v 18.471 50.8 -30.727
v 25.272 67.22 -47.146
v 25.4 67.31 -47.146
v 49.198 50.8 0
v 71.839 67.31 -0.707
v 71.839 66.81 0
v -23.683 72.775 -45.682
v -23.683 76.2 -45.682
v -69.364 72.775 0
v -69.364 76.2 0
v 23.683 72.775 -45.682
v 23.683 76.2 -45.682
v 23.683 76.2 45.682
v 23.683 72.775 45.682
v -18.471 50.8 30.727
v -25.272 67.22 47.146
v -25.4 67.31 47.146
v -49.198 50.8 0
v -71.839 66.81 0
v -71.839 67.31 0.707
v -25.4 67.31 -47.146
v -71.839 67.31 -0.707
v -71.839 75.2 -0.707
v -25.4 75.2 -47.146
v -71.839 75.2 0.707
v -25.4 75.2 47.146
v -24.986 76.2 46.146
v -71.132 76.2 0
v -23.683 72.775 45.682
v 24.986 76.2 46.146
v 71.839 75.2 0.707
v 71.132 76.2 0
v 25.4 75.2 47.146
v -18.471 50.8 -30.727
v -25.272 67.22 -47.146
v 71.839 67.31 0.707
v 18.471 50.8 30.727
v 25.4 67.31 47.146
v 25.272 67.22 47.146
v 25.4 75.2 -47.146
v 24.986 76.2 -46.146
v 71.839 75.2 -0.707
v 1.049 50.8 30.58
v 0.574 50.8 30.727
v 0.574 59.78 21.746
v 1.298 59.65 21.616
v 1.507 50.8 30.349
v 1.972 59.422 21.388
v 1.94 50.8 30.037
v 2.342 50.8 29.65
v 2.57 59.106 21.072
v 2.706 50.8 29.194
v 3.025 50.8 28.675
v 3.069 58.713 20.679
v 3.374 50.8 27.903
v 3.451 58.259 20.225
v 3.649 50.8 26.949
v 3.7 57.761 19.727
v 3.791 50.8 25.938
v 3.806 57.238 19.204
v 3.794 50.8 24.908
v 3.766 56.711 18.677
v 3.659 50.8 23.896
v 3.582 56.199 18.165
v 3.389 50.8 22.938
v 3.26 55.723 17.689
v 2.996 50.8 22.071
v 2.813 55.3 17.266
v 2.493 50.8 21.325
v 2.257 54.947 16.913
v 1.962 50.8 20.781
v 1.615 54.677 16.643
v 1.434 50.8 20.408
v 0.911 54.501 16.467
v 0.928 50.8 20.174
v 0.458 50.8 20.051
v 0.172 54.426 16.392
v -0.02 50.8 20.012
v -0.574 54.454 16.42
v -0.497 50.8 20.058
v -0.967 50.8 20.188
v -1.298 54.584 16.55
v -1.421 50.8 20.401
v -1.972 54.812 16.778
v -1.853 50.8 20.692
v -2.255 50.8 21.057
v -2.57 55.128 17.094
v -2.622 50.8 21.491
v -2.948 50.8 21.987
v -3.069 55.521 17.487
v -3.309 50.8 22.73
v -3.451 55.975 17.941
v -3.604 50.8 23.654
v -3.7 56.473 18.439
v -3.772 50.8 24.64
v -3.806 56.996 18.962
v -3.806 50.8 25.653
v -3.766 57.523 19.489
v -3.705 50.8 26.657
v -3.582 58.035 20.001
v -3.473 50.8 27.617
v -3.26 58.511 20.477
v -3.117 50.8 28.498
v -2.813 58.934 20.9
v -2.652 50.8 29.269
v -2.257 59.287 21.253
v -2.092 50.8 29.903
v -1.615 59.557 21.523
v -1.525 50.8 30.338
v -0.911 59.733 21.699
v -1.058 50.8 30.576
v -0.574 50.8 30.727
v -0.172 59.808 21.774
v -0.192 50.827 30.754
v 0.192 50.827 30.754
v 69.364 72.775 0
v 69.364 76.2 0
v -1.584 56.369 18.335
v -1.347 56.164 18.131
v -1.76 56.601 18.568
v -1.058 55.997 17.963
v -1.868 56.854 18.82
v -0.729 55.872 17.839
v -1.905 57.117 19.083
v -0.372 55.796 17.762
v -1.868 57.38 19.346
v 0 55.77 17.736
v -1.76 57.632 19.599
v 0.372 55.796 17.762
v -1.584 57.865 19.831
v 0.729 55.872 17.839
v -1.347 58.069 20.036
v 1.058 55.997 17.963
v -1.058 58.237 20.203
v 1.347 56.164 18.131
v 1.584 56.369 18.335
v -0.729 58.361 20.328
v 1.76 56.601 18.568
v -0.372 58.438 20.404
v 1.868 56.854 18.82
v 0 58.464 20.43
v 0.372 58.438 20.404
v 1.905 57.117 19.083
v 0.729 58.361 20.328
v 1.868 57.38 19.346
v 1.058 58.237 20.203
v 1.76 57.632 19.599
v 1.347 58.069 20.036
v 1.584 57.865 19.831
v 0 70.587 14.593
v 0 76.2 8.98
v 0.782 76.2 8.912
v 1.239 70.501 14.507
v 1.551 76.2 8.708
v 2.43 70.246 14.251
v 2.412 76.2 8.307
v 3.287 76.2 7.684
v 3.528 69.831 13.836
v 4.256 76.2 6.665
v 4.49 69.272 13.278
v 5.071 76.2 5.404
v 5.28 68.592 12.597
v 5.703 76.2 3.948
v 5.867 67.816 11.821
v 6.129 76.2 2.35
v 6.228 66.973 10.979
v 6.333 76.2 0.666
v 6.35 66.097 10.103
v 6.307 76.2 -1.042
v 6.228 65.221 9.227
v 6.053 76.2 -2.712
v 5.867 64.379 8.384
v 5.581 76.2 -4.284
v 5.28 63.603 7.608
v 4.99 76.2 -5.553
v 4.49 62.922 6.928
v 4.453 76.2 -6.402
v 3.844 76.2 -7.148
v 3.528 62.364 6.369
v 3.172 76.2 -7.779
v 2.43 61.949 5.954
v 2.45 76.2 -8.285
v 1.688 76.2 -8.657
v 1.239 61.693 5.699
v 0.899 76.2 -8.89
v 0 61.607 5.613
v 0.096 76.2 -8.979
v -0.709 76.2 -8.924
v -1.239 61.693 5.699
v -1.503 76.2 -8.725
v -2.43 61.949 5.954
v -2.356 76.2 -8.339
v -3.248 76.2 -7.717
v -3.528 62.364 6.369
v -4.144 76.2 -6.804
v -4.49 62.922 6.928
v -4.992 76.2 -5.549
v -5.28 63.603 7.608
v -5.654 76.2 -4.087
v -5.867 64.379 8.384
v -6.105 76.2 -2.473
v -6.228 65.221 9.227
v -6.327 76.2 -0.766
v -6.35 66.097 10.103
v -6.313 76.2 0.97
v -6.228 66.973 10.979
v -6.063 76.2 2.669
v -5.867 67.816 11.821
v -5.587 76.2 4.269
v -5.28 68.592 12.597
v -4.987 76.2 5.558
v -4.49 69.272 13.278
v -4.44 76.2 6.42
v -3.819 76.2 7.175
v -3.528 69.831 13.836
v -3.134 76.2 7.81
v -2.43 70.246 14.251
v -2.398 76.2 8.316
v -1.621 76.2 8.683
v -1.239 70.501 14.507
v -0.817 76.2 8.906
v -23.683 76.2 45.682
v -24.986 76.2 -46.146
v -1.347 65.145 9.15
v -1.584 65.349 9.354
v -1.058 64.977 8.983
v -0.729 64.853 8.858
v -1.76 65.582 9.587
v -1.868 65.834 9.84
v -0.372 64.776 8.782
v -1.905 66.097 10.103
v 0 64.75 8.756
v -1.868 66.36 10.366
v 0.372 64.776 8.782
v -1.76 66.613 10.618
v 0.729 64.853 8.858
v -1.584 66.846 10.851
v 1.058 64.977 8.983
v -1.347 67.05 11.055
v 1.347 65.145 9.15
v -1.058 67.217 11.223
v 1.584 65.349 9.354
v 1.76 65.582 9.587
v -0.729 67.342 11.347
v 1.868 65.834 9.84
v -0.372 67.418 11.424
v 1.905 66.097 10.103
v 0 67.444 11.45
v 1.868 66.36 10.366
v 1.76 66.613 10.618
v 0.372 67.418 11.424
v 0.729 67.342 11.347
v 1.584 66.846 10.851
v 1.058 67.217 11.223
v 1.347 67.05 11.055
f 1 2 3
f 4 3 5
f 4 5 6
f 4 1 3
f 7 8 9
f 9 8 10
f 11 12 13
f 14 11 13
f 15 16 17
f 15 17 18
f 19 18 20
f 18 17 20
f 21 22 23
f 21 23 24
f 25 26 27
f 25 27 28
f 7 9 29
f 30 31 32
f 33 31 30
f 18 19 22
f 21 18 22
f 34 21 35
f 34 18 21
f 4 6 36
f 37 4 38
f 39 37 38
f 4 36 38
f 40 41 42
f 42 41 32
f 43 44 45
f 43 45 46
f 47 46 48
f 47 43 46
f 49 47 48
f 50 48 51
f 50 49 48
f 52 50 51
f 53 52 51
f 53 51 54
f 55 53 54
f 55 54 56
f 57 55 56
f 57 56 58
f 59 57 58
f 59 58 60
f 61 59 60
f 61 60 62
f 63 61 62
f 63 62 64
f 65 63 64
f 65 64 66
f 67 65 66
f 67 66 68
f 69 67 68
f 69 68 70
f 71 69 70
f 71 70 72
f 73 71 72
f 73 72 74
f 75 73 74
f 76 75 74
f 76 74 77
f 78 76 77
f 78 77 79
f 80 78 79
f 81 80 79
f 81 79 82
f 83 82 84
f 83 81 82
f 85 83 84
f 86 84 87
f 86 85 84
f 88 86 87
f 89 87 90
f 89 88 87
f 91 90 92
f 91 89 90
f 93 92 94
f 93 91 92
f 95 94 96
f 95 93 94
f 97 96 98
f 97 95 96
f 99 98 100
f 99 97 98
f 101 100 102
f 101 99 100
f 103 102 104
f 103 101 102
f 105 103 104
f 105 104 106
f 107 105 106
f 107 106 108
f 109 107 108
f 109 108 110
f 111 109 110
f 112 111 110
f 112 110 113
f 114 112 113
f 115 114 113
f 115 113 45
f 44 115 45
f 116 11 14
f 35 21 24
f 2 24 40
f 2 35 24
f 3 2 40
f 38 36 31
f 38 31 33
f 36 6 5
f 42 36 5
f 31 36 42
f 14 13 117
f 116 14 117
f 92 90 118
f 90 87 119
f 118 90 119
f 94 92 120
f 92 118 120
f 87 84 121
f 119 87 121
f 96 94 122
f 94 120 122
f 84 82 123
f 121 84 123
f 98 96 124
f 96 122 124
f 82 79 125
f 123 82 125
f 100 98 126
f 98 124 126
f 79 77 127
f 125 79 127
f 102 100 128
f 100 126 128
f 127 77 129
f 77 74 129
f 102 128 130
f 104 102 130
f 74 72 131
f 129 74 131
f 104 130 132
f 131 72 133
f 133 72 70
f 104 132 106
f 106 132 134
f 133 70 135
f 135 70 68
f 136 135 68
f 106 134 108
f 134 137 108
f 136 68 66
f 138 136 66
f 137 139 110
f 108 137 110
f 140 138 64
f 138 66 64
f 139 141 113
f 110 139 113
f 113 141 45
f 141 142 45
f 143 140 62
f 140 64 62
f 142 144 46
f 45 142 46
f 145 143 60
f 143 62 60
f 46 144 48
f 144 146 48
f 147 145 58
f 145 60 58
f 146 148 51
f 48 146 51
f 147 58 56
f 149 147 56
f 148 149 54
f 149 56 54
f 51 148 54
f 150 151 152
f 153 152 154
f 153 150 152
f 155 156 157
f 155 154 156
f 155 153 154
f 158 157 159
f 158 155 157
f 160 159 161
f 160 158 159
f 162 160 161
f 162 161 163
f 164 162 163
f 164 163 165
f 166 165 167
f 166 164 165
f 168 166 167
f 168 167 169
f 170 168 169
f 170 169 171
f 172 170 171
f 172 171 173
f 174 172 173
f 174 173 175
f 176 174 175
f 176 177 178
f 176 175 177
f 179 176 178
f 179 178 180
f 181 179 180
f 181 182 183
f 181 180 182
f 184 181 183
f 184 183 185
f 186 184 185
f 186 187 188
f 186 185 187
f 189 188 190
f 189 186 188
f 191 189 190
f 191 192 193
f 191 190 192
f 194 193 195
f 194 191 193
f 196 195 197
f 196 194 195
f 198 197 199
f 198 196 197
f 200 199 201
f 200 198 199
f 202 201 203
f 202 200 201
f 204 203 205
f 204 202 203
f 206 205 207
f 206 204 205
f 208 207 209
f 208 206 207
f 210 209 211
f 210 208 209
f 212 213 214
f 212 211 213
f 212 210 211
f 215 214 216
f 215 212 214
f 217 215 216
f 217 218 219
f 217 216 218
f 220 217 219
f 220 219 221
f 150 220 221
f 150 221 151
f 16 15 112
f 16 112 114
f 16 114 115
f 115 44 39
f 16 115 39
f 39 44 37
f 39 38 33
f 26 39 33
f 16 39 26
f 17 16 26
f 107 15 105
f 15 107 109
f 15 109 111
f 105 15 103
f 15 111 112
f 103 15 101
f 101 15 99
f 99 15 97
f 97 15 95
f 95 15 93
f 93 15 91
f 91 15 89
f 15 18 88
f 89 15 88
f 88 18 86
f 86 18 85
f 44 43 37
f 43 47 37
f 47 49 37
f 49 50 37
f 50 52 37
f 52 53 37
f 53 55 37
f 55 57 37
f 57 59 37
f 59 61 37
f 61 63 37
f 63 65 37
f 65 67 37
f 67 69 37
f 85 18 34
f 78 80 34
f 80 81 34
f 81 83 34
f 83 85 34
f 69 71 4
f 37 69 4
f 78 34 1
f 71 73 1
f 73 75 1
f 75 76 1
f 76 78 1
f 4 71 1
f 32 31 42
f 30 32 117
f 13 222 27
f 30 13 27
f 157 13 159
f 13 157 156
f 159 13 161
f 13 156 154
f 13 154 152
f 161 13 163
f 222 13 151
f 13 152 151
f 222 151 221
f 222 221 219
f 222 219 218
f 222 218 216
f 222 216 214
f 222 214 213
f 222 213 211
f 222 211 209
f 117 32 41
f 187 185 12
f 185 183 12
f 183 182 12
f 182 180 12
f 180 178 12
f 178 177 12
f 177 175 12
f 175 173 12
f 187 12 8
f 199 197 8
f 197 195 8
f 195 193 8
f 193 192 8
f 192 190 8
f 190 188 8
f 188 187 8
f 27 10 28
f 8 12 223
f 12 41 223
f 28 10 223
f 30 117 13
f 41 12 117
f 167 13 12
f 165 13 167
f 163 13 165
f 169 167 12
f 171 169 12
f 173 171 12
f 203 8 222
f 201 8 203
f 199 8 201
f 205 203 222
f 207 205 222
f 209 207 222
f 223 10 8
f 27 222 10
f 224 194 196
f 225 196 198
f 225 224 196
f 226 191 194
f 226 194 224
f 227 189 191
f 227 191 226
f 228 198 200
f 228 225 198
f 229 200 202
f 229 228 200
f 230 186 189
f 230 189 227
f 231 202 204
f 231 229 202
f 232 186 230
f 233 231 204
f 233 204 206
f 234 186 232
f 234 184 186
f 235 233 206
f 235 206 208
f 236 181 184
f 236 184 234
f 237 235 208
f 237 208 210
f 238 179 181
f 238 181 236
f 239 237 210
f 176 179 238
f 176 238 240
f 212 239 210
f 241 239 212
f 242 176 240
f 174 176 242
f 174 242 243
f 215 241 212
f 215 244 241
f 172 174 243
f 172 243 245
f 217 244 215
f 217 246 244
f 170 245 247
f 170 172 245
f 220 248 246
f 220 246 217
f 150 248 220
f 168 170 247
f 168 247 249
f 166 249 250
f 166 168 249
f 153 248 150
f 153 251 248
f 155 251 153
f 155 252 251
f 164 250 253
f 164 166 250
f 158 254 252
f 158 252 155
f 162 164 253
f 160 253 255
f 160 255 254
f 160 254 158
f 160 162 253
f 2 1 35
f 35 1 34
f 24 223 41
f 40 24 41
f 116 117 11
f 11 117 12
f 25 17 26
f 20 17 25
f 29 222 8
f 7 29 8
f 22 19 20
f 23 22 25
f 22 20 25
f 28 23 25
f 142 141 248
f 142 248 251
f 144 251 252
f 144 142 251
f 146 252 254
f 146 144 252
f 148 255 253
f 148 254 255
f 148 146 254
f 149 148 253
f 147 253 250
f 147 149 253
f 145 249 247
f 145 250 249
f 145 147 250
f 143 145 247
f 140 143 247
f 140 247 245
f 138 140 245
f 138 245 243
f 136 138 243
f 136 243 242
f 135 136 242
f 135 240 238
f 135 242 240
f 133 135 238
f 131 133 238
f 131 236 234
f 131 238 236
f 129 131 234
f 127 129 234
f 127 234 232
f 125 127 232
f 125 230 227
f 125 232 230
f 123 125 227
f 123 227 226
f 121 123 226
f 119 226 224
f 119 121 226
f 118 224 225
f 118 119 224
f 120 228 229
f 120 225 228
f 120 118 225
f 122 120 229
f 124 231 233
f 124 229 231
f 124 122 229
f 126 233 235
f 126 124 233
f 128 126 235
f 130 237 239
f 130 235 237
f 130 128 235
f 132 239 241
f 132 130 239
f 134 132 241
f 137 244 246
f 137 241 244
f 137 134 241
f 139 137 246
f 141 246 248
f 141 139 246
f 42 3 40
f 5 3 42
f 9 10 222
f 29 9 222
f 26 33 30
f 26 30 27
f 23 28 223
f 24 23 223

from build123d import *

# Parameters (mm, degrees)
BOSS_EXTRUDE1_DEPTH     = 76.2
CHAMFER1_SIZE           = 16.51
CHAMFER2_SIZE           = 1
CUT_EXTRUDE1_DEPTH      = 3.425
SKETCH5_R               = 1.905
CUT_EXTRUDE2_DEPTH      = 114.174020707
CUT_EXTRUDE3_DEPTH      = 118.371627589
CUT_EXTRUDE3_DEPTH_BACK = 12.7
SKETCH6_R               = 6.35
SKETCH5_3_R             = 3.81
CUT_EXTRUDE4_DEPTH      = 12.7


with BuildPart() as part:
    # Sketch1 → Boss-Extrude1 (new body)
    with BuildSketch(Plane(origin=(0, 0, 0), x_dir=(1, 0, 0), z_dir=(0, 1, 0))):
        Polygon((-25.4, 47.146344636), (25.4, 47.146344636), (72.546344636, 0), (25.4, -47.146344636), (-25.4, -47.146344636), (-72.546344636, 0), align=None)
    extrude(amount=BOSS_EXTRUDE1_DEPTH)

    # SurfaceCut1
    split(bisect_by=Plane(origin=(0, 10.036699622, 10.036699622), x_dir=(-1, 0, 0), z_dir=(0, 0.7071067811865464, 0.7071067811865488)), keep=Keep.TOP)

    # SurfaceCut2
    split(bisect_by=Plane(origin=(0, 10.036699622, -10.036699622), x_dir=(1, 0, 0), z_dir=(0, 0.7071067811865464, -0.7071067811865488)), keep=Keep.TOP)

    # SurfaceCut3
    split(bisect_by=Plane(origin=(0, 50.8, 0), x_dir=(1, 0, 0), z_dir=(0, 1, 0)), keep=Keep.TOP)

    # Chamfer1
    chamfer1_edges = [part.edges().sort_by_distance(p)[0] for p in [
        (-57.183044257, 50.8, 15.363300378),
        (-57.183044257, 50.8, -15.363300378),
        (57.183044257, 50.8, 15.363300378),
        (57.183044257, 50.8, -15.363300378),
    ]]
    chamfer(chamfer1_edges, length=CHAMFER1_SIZE)

    # Chamfer2
    chamfer2_edges = [part.edges().sort_by_distance(p)[0] for p in [
        (72.546344636, 71.755, 0),
        (-72.546344636, 71.755, 0),
        (0, 76.2, 47.146344636),
        (48.973172318, 76.2, 23.573172318),
        (48.973172318, 76.2, -23.573172318),
        (0, 76.2, -47.146344636),
        (-48.973172318, 76.2, -23.573172318),
        (-48.973172318, 76.2, 23.573172318),
    ]]
    chamfer(chamfer2_edges, length=CHAMFER2_SIZE)

    # Sketch2 → Cut-Extrude1 (cut)
    with BuildSketch(Plane(origin=(0, 76.2, 0), x_dir=(1, 0, 0), z_dir=(0, 1, 0))):
        Polygon((-23.68275885, 45.681605271), (-69.36436412, 0), (-23.682753383, -45.681610738), align=None)
        Polygon((69.36436412, 0), (23.682756199, 45.681607921), (23.682745222, -45.681618898), align=None)
    extrude(amount=-CUT_EXTRUDE1_DEPTH, mode=Mode.SUBTRACT)

    # Sketch5 → Cut-Extrude2 (cut, through all)
    with BuildSketch(Plane(origin=(0, 10.036699622, -10.036699622), x_dir=(1, 0, 0), z_dir=(0, 0.7071067811865464, -0.7071067811865488))):
        with Locations(Location((0, -53.881536726, 0), (0, 0, 270))):
            Circle(SKETCH5_R)
    extrude(amount=CUT_EXTRUDE2_DEPTH, mode=Mode.SUBTRACT)

    # Sketch6 → Cut-Extrude3 (cut, two sides: drawn at the far end of the back side and taken through both)
    with BuildSketch(Plane(origin=(0, 36.977467985, -36.977467985), x_dir=(1, 0, 0), z_dir=(0, 0.7071067811865464, -0.7071067811865488)).offset(-CUT_EXTRUDE3_DEPTH_BACK)):
        with Locations(Location((0, -53.881536726, 0), (0, 0, 270))):
            Circle(SKETCH6_R)
    extrude(amount=CUT_EXTRUDE3_DEPTH + CUT_EXTRUDE3_DEPTH_BACK, mode=Mode.SUBTRACT)

    # Sketch5<3> → Cut-Extrude4 (cut)
    with BuildSketch(Plane(origin=(0, 10.036699622, -10.036699622), x_dir=(1, 0, 0), z_dir=(0, 0.7071067811865464, -0.7071067811865488))):
        with Locations(Location((0, -53.881536726, 0), (0, 0, 278.668745784))):
            Circle(SKETCH5_3_R)
    extrude(amount=CUT_EXTRUDE4_DEPTH, mode=Mode.SUBTRACT)


solid = part.part
